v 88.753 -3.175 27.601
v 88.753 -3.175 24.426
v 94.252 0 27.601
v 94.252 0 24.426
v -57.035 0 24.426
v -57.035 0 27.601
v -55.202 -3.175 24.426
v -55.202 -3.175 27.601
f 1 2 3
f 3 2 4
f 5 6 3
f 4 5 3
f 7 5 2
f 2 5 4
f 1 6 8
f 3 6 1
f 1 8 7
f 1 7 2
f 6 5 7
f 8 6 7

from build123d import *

# Parameters (mm, degrees)
F0_W        = 152.4
F0_H        = 3.175
F1_DEPTH    = 3.175
F2_T1_DEPTH = 23.6619672735
F3_T1_DEPTH = 35.0436157588


# Not quite as in the source:
# - a fillet or chamfer that OpenCascade refuses, or shapes differently, is made with other operations: its cross-section is extruded or revolved along the edge and cut away or added


with BuildPart() as f1:
    # F0 (on Front) → F1 (new body)
    with BuildSketch(Plane.XZ):
        with Locations((18.7120195478, 26.0135995823)):
            Rectangle(F0_W, F0_H)
    extrude(amount=F1_DEPTH)

    # F2: chamfer of 2.286 x 3.9594681461 on 1 edges, made by hand

    # F2_s2 → F2_t1 (cut)
    with BuildSketch(Plane.XY.offset(14.1826159455)):
        Polygon((-57.4879804522, 0.7844681461), (-55.2019804522, -3.175), (-57.4879804522, -3.175), align=None)
    extrude(amount=F2_T1_DEPTH, mode=Mode.SUBTRACT)

    # F3: chamfer of 3.556 x 6.1591726717 on 1 edges, made by hand

    # F3_s2 → F3_t1 (cut)
    with BuildSketch(Plane.XY.offset(8.4917917029)):
        Polygon((88.7528468761, -3.175), (94.9120195478, 0.381), (94.9120195478, -3.175), align=None)
    extrude(amount=F3_T1_DEPTH, mode=Mode.SUBTRACT)


solid = f1.part
